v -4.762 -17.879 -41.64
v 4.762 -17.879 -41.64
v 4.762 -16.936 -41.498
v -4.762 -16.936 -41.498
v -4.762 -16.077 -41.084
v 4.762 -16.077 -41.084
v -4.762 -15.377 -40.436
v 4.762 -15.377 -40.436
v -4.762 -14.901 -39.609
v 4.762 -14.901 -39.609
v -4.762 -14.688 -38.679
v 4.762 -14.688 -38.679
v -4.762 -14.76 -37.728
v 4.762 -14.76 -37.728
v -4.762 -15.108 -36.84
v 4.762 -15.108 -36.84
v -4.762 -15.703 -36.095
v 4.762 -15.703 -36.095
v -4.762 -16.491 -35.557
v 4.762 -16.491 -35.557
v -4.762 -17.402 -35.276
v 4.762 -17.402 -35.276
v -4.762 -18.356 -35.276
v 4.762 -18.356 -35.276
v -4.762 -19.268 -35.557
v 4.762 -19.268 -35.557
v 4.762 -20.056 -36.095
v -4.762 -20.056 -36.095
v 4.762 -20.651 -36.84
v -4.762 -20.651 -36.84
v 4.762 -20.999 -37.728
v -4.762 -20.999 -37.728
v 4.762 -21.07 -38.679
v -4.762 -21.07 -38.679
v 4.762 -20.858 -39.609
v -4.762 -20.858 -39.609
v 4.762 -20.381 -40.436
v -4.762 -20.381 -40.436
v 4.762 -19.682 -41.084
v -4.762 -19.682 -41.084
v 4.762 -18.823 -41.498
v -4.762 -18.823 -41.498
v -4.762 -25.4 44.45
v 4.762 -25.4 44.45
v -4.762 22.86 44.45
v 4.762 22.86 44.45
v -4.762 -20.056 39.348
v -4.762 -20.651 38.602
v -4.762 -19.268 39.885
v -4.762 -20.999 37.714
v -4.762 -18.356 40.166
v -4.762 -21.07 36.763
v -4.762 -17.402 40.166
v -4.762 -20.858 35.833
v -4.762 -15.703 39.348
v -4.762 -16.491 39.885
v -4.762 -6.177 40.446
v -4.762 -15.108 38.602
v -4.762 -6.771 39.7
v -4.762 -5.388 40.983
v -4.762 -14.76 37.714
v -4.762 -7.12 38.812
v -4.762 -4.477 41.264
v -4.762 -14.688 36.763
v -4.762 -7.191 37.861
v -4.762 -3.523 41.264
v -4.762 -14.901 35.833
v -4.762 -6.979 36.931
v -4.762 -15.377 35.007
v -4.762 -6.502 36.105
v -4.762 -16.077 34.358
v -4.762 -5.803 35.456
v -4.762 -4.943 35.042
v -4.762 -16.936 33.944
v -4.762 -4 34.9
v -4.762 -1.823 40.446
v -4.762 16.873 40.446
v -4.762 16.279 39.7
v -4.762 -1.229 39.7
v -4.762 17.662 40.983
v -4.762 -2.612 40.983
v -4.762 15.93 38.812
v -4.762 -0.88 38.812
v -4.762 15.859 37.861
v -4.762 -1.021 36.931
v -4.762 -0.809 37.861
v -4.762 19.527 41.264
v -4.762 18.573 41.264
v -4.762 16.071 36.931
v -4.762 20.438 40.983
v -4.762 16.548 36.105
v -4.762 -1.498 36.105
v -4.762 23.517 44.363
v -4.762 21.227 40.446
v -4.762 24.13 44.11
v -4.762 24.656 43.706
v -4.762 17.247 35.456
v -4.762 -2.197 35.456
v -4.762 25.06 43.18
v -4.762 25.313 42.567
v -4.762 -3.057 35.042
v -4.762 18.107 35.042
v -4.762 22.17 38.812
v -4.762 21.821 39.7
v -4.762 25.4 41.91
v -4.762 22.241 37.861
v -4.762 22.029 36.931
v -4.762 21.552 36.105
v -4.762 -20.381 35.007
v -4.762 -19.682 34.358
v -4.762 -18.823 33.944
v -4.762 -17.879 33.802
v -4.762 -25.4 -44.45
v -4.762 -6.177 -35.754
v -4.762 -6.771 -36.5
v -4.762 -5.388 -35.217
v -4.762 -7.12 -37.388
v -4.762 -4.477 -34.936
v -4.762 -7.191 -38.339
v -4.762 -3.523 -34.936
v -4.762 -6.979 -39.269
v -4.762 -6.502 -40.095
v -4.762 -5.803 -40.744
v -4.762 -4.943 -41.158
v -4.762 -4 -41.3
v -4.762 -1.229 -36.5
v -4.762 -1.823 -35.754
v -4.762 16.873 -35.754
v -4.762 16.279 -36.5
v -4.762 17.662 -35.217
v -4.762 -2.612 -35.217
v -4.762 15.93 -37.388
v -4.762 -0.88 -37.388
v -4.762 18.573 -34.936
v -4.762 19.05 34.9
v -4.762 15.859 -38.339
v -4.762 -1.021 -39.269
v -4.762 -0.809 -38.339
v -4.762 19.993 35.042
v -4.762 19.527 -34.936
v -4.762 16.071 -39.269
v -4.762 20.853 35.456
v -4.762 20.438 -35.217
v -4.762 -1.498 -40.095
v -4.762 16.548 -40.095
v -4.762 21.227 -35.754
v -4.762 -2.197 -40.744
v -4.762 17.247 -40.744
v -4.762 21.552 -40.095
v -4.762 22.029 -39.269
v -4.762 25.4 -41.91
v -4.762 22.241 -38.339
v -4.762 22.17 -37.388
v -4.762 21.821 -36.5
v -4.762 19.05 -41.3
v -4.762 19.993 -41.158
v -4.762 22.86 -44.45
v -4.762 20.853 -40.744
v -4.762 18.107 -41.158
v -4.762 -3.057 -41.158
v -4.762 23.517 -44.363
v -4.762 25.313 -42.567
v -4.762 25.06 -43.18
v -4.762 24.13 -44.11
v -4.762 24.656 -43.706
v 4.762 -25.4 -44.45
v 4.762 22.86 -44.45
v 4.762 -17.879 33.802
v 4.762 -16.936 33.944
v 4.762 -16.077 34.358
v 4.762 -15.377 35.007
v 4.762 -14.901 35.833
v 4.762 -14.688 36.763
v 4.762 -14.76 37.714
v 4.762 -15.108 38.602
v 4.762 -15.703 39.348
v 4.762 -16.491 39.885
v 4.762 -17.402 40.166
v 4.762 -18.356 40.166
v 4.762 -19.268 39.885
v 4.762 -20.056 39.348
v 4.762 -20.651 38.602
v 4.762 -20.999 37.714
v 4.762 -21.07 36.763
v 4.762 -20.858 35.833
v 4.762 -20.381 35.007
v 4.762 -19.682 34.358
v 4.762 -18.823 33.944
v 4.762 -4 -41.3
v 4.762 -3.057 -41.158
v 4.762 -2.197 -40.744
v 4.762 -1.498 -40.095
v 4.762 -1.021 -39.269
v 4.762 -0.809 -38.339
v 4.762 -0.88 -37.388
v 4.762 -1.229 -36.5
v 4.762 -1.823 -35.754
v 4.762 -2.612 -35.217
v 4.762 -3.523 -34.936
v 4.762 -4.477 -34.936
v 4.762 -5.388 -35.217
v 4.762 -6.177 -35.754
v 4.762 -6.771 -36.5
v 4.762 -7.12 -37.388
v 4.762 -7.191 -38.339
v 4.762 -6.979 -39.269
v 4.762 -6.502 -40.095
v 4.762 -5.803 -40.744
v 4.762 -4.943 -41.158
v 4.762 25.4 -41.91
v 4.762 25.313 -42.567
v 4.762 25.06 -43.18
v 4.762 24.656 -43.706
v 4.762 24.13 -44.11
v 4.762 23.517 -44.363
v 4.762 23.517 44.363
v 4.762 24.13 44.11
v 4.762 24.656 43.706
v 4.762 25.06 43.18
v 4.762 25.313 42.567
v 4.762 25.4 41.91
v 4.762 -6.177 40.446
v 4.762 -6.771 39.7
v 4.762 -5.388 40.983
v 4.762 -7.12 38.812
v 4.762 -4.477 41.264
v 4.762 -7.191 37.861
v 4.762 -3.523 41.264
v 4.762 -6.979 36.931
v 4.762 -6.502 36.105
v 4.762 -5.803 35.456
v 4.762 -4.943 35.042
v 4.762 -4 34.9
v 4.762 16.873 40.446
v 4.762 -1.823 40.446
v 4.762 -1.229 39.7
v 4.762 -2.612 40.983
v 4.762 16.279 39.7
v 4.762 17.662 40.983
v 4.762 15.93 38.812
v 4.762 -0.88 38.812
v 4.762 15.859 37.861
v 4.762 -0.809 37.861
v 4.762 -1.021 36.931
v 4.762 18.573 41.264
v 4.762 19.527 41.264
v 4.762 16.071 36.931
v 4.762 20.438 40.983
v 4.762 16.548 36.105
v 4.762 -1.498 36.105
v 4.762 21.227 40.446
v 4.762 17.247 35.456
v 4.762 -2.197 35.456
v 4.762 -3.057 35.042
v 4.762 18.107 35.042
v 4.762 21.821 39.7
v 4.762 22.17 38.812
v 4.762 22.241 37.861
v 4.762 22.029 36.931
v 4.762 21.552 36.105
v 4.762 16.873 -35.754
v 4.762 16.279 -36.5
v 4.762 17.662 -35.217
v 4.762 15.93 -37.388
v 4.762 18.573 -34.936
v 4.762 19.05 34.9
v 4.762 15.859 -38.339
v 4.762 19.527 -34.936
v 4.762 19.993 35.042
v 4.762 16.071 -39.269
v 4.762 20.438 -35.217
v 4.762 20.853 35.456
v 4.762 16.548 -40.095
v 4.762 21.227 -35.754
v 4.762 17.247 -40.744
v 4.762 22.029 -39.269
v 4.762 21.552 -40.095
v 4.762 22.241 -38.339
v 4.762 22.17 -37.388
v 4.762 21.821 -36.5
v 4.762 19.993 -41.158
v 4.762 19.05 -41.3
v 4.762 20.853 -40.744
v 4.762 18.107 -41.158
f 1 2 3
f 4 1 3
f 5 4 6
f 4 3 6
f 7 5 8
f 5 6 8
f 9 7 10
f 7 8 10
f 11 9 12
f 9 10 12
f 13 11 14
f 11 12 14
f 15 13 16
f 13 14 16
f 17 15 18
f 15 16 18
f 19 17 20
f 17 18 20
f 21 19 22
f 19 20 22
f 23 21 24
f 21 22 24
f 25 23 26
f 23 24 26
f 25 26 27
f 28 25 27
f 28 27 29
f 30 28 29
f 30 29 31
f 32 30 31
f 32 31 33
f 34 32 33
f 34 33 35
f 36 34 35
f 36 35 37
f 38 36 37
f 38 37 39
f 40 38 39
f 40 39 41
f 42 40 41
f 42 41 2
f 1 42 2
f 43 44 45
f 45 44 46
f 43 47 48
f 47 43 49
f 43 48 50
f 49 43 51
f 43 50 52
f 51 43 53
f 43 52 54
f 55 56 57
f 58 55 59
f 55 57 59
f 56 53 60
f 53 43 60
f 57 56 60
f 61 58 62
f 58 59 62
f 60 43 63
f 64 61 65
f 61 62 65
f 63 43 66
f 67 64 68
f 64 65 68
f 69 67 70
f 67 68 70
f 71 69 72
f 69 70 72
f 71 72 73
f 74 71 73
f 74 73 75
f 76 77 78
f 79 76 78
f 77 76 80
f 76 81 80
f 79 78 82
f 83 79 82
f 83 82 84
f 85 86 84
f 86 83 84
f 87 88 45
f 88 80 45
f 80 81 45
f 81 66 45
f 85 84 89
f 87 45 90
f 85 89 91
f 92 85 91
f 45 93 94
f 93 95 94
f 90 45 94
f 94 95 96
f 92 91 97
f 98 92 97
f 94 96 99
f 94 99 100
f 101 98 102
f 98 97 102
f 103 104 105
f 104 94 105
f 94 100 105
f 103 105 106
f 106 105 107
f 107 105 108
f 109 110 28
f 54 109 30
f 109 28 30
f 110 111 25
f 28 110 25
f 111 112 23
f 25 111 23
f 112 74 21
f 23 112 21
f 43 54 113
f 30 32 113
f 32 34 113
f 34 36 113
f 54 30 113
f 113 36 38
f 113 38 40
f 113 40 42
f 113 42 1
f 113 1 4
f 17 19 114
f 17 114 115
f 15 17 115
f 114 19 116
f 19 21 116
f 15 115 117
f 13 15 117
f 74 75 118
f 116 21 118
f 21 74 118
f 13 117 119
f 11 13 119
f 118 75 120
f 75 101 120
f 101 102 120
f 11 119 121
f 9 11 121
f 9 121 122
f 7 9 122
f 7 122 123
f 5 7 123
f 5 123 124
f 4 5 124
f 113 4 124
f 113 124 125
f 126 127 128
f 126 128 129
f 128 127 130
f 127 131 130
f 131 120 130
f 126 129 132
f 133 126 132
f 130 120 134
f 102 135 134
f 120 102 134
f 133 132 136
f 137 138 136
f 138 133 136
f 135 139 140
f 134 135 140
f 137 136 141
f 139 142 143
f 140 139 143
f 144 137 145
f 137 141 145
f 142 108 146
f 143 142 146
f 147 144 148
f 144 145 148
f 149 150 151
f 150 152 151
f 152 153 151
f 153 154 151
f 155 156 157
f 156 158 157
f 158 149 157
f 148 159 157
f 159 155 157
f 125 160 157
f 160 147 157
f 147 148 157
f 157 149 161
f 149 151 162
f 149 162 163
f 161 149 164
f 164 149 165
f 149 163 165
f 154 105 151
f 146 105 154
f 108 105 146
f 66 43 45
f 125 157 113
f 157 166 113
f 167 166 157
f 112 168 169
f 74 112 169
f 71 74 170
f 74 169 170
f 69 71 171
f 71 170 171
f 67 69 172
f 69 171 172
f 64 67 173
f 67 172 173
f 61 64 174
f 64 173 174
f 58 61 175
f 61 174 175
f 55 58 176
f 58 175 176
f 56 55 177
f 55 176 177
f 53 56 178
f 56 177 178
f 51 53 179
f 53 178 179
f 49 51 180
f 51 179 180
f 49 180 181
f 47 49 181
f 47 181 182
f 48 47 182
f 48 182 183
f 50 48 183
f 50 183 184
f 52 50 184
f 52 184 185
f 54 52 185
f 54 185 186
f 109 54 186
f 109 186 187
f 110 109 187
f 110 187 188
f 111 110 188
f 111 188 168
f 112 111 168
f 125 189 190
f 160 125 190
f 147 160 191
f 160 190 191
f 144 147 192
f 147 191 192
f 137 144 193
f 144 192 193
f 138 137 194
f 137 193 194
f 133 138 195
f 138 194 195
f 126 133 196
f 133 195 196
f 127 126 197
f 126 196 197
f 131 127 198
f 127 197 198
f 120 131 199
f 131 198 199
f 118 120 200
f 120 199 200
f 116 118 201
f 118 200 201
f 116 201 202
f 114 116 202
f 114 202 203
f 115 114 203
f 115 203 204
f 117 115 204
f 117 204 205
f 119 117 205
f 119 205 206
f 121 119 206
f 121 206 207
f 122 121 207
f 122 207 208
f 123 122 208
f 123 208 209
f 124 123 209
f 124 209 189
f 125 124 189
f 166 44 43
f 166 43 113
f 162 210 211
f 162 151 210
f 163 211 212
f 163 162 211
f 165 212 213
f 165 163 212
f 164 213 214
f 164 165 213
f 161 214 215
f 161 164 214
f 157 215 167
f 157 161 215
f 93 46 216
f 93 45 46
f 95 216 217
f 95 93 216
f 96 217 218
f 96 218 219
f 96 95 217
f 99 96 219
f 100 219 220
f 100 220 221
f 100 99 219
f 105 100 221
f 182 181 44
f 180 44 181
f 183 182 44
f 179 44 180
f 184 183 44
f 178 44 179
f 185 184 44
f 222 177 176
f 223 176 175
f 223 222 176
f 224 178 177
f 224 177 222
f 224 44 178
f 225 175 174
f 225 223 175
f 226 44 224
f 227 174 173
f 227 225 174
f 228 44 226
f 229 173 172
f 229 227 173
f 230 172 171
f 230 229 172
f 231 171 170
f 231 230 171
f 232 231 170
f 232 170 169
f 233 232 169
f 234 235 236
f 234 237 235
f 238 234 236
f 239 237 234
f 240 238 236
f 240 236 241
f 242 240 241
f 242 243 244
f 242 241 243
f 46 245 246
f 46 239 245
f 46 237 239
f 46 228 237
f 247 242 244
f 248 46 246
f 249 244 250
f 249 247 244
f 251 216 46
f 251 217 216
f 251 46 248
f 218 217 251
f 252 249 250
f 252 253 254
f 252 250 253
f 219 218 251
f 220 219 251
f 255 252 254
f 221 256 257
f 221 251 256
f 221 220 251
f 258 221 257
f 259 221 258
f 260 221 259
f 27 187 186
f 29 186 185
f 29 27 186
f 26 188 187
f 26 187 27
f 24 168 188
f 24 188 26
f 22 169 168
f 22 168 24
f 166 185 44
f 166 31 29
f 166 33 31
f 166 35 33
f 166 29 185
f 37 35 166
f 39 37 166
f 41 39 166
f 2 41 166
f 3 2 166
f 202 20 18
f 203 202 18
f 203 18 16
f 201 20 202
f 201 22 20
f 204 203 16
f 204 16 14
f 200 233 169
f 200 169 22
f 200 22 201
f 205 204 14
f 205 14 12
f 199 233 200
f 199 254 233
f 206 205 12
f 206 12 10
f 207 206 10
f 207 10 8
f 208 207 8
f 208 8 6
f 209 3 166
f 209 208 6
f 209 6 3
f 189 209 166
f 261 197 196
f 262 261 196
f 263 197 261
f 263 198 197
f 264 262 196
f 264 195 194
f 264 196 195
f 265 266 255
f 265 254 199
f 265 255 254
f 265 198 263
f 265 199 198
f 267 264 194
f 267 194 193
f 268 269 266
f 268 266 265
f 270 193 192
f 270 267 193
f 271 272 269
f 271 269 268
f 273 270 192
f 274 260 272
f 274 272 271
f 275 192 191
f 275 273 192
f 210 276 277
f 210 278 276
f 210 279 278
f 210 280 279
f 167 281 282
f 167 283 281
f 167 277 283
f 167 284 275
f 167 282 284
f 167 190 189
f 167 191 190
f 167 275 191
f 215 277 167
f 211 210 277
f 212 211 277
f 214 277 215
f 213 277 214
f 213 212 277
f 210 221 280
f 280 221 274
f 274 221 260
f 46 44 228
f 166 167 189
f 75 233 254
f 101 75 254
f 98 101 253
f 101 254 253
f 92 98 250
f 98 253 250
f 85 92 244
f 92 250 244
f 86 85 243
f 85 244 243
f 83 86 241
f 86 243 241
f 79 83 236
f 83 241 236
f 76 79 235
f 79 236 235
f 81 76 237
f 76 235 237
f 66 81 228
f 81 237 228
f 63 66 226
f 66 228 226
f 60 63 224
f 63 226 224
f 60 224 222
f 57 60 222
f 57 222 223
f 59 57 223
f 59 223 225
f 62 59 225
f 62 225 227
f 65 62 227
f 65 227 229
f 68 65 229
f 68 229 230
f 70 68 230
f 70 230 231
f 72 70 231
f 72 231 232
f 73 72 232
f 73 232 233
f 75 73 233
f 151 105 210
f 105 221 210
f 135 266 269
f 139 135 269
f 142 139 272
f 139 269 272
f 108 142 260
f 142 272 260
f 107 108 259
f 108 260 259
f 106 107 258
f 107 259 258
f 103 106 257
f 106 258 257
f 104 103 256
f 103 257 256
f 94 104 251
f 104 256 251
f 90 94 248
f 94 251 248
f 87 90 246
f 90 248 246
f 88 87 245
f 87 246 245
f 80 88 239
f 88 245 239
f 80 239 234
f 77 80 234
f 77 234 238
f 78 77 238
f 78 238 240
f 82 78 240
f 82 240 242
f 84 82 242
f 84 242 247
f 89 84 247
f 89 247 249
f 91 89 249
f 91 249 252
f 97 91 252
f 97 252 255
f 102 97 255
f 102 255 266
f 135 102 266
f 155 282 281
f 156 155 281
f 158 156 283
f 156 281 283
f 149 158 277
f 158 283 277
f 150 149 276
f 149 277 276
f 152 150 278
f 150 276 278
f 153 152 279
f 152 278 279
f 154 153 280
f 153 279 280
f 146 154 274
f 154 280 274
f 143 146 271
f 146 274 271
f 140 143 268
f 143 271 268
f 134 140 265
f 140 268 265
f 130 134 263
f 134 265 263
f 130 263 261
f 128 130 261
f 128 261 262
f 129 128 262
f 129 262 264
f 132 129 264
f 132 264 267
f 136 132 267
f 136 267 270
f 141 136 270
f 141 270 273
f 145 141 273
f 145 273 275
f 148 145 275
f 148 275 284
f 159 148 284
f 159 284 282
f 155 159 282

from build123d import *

# Parameters (mm, degrees)
SKETCH1_W           = 88.9
SKETCH1_H           = 50.8
BOSS_EXTRUDE1_DEPTH = 4.7625
SKETCH2_R           = 3.2
CUT_EXTRUDE1_DEPTH  = 10.525
FILLET3_R           = 2.54
FILLET4_R           = 2.54
SKETCH4_R           = 3.2
CUT_EXTRUDE5_DEPTH  = 10.525


with BuildPart() as part:
    # Sketch1 → Boss-Extrude1 (new body, symmetric)
    with BuildSketch(Plane(origin=(0, 0, 0), x_dir=(0, 0, -1), z_dir=(1, 0, 0))):
        Rectangle(SKETCH1_W, SKETCH1_H)
    extrude(amount=BOSS_EXTRUDE1_DEPTH, both=True)

    # Sketch2 → Cut-Extrude1 (cut, through all)
    with BuildSketch(Plane(origin=(4.7625, 0, 0), x_dir=(0, 0, -1), z_dir=(1, 0, 0))):
        with Locations((-38.1, 19.05)):
            Circle(SKETCH2_R)
        with Locations((38.1, 19.05)):
            Circle(SKETCH2_R)
        with Locations((-38.1, -4)):
            Circle(SKETCH2_R)
        with Locations((38.1, -4)):
            Circle(SKETCH2_R)
    extrude(amount=-CUT_EXTRUDE1_DEPTH, mode=Mode.SUBTRACT)

    # Fillet3
    fillet3_edges = [part.edges().sort_by_distance(p)[0] for p in [
        (0, 25.4, 44.45),
    ]]
    fillet(fillet3_edges, radius=FILLET3_R)

    # Fillet4
    fillet4_edges = [part.edges().sort_by_distance(p)[0] for p in [
        (0, 25.4, -44.45),
    ]]
    fillet(fillet4_edges, radius=FILLET4_R)

    # Sketch4 → Cut-Extrude5 (cut, through all)
    with BuildSketch(Plane(origin=(4.7625, 0, 0), x_dir=(0, 0, -1), z_dir=(1, 0, 0))):
        with Locations((-37.002111381, -17.879327913)):
            Circle(SKETCH4_R)
        with Locations((38.440338437, -17.879327913)):
            Circle(SKETCH4_R)
    extrude(amount=-CUT_EXTRUDE5_DEPTH, mode=Mode.SUBTRACT)


solid = part.part
